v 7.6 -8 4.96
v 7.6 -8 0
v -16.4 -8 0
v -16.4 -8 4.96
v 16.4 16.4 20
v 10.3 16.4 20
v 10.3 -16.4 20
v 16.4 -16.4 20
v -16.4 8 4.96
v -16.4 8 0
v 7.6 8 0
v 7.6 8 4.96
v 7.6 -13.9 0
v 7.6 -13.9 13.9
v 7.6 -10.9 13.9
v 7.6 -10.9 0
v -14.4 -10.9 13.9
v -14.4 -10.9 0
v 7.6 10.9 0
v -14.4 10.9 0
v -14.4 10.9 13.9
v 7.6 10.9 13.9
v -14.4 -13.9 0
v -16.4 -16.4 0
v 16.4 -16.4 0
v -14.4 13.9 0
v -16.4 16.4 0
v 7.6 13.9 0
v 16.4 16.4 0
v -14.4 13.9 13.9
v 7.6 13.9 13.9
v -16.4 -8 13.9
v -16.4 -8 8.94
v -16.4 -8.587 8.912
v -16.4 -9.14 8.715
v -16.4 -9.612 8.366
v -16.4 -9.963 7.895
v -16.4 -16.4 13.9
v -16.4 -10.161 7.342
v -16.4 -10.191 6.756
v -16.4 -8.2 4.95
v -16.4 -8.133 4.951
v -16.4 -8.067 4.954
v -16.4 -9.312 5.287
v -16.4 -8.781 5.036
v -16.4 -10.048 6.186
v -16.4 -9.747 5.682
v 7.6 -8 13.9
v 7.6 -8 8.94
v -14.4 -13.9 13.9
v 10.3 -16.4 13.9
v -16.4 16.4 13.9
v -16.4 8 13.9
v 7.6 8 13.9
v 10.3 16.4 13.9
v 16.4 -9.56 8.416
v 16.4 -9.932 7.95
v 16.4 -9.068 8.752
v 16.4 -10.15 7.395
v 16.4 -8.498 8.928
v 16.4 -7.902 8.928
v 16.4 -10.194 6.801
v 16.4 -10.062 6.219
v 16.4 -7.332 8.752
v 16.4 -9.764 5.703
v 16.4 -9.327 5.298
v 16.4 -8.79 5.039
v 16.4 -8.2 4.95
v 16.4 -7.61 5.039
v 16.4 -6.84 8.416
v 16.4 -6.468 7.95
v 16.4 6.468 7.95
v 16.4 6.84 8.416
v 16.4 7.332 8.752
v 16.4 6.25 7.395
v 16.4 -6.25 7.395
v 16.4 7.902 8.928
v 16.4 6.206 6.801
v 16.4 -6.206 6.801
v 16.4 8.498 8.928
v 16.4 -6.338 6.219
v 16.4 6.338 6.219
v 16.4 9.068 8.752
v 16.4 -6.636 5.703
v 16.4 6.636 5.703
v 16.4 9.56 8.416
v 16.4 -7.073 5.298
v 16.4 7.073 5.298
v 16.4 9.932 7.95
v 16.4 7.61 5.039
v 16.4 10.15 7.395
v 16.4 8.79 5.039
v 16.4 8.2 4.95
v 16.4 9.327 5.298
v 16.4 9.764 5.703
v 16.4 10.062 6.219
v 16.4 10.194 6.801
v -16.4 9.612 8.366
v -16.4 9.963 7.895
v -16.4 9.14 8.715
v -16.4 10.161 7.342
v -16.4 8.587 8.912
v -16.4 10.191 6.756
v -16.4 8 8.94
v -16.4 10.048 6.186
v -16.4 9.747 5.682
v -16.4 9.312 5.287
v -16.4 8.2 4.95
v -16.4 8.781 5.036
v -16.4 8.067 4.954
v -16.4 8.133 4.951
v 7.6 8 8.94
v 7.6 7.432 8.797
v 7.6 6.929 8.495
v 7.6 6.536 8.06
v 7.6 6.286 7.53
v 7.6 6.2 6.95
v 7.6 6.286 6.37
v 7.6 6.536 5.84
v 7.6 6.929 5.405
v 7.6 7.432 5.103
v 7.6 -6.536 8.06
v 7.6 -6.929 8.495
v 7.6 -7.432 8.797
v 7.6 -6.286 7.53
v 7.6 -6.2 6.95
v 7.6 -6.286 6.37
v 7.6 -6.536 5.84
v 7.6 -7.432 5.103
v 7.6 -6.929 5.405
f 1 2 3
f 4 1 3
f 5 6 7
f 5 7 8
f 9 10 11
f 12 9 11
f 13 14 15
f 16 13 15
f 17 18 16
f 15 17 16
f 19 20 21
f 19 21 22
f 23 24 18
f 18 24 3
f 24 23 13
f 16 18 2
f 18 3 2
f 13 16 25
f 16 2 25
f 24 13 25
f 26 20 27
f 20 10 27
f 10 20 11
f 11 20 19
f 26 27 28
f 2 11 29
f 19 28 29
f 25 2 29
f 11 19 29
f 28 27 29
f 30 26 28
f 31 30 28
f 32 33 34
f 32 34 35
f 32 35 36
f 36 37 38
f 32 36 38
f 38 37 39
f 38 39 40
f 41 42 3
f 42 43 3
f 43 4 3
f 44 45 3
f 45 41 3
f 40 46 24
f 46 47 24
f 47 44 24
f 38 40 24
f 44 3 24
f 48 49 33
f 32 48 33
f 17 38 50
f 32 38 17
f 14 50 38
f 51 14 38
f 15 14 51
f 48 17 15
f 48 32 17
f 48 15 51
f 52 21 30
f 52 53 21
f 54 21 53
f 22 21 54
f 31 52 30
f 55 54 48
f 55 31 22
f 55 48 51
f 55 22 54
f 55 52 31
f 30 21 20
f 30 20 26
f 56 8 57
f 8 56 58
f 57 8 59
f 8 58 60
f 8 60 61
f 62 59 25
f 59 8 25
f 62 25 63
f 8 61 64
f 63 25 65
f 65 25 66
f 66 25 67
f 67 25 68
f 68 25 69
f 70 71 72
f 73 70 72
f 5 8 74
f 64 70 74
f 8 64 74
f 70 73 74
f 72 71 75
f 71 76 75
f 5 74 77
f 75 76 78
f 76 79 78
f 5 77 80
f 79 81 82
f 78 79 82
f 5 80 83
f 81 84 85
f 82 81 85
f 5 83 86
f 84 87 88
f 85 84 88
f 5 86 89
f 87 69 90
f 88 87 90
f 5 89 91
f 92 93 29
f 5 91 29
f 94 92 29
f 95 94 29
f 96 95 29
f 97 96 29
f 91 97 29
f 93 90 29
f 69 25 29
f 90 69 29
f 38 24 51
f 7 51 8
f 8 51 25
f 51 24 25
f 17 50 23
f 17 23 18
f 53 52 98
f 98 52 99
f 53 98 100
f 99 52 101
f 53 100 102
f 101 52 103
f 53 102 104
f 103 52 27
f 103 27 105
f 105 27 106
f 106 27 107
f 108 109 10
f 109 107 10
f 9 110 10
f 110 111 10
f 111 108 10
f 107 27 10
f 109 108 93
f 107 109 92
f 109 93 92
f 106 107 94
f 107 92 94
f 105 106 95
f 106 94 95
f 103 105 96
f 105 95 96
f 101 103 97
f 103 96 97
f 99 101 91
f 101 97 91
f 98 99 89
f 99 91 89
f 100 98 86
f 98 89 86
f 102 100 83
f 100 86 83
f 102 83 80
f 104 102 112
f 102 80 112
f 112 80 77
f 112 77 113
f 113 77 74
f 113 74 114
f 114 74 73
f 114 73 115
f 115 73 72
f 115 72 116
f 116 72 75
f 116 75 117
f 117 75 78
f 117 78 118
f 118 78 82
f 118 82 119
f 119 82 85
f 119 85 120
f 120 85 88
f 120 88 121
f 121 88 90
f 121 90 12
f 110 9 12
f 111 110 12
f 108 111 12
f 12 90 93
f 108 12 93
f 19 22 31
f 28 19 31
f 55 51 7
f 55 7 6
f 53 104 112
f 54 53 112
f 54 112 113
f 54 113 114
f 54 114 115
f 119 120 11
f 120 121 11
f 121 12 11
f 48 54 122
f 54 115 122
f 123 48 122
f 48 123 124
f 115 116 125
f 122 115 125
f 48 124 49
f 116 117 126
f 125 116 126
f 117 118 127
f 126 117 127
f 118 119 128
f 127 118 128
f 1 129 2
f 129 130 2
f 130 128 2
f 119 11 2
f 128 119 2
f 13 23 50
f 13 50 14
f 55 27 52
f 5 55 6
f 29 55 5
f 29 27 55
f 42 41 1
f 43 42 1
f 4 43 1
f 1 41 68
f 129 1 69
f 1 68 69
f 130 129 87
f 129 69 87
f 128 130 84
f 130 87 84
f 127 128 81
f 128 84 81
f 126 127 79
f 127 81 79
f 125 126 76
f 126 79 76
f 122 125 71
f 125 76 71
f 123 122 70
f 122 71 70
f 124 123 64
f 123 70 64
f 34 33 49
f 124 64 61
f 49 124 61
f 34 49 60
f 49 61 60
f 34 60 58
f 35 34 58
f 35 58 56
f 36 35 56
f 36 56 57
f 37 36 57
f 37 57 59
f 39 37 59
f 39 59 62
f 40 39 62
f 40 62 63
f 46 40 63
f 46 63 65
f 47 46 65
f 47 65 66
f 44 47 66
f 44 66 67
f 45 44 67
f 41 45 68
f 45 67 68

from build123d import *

# Parameters (mm, degrees)
SKETCH1_W           = 22
SKETCH1_H           = 3
BOSS_EXTRUDE1_DEPTH = 13.9
SKETCH1_3_W         = 6.1
SKETCH1_3_H         = 32.8
BOSS_EXTRUDE2_DEPTH = 20
SKETCH2_R           = 2
CUT_EXTRUDE1_DEPTH  = 42.7708032


with BuildPart() as part:
    # Sketch1 → Boss-Extrude1 (new body)
    with BuildSketch(Plane.XY):
        Polygon((-16.4, -8), (-16.4, -16.4), (10.3, -16.4), (10.3, 16.4), (-16.4, 16.4), (-16.4, 8), (7.6, 8), (7.6, -8), align=None)
        with Locations((-3.4, -12.4)):
            Rectangle(SKETCH1_W, SKETCH1_H, mode=Mode.SUBTRACT)
        with Locations((-3.4, 12.4)):
            Rectangle(SKETCH1_W, SKETCH1_H, mode=Mode.SUBTRACT)
    extrude(amount=BOSS_EXTRUDE1_DEPTH)

    # Sketch1<3> → Boss-Extrude2 (add)
    with BuildSketch(Plane.XY):
        with Locations((13.35, 0)):
            Rectangle(SKETCH1_3_W, SKETCH1_3_H)
    extrude(amount=BOSS_EXTRUDE2_DEPTH)

    # Sketch2 → Cut-Extrude1 (cut, through all)
    with BuildSketch(Plane(origin=(16.4, 0, 0), x_dir=(0, 0, -1), z_dir=(1, 0, 0))):
        with Locations((-6.95, 8.2)):
            Circle(SKETCH2_R)
        with Locations((-6.95, -8.2)):
            Circle(SKETCH2_R)
    extrude(amount=-CUT_EXTRUDE1_DEPTH, mode=Mode.SUBTRACT)


solid = part.part
